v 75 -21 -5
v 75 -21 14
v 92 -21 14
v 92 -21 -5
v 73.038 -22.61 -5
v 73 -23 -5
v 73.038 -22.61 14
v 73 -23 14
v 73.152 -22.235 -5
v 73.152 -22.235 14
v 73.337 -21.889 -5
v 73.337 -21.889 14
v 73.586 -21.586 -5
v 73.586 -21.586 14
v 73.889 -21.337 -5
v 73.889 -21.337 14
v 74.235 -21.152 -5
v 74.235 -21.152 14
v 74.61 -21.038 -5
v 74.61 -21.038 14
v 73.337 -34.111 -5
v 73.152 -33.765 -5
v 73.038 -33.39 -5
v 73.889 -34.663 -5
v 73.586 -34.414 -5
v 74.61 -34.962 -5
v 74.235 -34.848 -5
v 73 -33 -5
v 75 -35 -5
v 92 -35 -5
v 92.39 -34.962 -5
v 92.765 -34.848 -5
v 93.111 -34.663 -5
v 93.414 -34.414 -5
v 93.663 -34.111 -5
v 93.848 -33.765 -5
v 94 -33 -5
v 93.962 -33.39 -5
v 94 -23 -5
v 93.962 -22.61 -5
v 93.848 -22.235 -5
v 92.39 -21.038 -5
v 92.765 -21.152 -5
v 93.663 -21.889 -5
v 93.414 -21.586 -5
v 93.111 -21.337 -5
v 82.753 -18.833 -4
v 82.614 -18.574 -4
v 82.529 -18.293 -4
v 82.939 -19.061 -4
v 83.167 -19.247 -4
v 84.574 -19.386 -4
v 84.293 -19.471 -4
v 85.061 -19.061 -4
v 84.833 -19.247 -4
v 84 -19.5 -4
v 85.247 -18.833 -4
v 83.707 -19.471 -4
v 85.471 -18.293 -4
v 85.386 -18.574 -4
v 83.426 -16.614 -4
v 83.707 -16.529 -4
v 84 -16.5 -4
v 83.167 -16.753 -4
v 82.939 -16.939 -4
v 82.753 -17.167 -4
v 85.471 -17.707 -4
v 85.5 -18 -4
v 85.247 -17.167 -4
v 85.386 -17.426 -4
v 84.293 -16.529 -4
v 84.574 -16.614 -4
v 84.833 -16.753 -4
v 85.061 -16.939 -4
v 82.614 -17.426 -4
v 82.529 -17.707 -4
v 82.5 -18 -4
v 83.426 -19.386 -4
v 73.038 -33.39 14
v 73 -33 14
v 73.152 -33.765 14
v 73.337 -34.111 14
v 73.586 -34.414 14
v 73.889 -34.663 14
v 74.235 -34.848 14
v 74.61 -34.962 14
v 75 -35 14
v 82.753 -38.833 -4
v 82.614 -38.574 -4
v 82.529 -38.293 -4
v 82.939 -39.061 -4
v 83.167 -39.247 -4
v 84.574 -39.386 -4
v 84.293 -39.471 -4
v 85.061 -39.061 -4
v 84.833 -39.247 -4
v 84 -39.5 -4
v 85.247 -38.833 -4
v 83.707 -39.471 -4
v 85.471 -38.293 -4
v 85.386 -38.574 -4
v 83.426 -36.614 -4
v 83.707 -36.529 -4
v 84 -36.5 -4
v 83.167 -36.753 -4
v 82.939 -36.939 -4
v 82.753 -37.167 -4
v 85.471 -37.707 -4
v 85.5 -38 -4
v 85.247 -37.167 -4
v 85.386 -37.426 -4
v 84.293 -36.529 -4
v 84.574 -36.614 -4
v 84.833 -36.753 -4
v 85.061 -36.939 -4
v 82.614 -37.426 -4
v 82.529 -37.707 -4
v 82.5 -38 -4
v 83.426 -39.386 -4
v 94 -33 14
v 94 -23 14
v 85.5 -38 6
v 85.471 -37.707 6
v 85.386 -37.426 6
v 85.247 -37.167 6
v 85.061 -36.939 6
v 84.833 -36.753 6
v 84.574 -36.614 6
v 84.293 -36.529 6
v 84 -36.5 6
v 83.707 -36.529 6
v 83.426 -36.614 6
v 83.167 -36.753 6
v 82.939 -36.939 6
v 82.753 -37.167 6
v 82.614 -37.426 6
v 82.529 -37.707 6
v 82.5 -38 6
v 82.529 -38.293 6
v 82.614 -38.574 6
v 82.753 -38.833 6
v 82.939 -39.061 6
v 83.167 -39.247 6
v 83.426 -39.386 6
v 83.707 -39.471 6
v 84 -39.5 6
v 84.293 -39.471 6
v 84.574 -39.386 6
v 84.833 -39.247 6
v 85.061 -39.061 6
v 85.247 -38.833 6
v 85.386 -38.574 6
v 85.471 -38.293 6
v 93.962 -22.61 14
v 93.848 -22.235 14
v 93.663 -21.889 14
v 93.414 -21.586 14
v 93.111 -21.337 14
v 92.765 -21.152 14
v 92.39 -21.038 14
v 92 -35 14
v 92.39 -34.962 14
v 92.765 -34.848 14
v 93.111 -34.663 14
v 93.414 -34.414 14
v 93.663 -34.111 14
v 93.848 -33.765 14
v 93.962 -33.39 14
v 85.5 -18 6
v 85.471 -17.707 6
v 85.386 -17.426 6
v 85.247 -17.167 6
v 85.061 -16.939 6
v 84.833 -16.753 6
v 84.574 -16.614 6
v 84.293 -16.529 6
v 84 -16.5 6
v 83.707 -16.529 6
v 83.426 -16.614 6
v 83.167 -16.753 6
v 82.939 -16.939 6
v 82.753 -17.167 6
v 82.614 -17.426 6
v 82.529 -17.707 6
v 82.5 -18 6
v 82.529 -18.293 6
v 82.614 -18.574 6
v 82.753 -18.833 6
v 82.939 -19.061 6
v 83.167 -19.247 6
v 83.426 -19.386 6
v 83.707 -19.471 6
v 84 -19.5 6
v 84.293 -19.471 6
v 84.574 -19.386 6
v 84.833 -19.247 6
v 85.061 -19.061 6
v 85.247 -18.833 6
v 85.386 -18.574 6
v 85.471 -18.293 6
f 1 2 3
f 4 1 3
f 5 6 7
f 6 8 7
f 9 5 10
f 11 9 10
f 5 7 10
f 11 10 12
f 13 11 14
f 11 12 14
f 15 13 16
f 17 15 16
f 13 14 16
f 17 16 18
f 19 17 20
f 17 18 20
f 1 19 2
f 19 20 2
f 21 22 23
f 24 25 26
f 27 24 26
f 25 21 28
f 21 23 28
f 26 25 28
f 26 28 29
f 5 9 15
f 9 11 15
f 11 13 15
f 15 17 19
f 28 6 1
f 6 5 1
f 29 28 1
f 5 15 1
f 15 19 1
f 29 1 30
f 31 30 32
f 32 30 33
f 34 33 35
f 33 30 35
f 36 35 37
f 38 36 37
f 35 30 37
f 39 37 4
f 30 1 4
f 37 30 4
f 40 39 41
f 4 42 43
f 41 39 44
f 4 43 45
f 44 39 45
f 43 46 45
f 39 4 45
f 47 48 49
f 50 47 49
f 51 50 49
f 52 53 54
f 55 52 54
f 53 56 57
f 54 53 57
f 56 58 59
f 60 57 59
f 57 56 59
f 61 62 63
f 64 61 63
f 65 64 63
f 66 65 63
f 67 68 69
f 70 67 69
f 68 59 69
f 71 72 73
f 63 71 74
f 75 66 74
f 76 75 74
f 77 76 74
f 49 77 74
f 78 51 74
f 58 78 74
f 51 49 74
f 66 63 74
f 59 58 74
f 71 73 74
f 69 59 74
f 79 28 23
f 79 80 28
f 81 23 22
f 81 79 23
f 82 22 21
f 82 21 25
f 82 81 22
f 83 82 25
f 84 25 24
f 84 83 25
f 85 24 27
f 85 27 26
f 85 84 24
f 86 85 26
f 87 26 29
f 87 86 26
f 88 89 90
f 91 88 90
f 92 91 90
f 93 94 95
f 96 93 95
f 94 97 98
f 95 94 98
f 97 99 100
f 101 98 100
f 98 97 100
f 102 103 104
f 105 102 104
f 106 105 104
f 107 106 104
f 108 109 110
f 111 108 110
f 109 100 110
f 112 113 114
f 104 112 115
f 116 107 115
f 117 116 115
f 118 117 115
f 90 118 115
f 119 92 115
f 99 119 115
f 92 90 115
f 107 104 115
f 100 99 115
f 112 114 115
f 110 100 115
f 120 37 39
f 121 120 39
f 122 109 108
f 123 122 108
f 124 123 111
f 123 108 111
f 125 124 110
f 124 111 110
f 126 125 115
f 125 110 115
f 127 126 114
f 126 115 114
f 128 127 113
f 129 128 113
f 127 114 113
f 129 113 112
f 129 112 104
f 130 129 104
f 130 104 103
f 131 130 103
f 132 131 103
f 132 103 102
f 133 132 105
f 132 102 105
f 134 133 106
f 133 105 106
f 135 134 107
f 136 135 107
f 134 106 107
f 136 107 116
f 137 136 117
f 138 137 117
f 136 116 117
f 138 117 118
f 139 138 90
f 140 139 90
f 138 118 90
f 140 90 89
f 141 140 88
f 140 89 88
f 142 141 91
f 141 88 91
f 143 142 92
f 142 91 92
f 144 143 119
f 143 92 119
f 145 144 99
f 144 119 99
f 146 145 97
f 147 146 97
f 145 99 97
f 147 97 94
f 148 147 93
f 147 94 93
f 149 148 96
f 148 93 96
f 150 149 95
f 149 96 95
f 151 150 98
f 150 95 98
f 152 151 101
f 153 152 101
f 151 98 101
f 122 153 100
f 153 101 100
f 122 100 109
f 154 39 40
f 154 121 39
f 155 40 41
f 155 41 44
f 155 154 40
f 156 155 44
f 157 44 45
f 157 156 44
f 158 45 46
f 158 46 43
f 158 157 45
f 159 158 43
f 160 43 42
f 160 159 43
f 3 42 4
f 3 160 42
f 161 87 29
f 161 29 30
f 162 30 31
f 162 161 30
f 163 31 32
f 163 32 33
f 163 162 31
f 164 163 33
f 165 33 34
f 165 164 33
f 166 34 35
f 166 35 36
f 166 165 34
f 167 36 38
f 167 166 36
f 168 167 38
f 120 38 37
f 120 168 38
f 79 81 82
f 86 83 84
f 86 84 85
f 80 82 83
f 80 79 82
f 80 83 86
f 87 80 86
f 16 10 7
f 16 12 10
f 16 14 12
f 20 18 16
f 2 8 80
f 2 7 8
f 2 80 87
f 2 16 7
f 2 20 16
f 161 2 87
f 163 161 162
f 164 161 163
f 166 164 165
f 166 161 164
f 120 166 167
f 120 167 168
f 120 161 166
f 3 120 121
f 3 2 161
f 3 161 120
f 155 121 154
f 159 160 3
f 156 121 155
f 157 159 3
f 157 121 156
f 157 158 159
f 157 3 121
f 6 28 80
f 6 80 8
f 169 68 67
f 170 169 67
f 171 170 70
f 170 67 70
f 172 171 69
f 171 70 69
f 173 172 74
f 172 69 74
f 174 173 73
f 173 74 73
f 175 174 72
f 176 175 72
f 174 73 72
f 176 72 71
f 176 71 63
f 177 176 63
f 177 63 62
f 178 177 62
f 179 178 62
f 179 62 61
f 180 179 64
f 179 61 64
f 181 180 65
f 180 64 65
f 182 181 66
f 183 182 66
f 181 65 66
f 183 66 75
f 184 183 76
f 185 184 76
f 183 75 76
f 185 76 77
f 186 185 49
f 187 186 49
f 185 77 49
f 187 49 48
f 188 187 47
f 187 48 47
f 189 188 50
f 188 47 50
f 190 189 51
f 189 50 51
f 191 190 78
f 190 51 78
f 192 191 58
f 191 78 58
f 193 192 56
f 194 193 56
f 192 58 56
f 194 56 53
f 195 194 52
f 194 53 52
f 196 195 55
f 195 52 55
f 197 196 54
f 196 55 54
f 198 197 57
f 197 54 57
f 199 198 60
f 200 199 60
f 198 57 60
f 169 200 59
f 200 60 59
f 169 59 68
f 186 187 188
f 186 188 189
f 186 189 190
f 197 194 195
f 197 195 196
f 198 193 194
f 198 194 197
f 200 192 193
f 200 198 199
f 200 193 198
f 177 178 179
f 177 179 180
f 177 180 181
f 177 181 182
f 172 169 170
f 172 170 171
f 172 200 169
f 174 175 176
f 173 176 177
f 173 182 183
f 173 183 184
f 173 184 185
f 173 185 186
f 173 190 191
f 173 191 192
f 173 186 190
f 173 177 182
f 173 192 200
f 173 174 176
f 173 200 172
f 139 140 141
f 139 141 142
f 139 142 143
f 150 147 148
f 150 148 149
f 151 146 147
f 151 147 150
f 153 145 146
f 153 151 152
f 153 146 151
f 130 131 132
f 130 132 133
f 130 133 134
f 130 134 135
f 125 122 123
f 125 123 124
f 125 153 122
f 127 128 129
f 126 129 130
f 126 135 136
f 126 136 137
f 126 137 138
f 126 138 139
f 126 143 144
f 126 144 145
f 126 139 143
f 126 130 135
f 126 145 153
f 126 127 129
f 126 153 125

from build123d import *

# Parameters (mm, degrees)
CYLINDER040_R     = 1.5
CYLINDER040_DEPTH = 10
CYLINDER039_R     = 1.5
CYLINDER039_DEPTH = 10
BOX043_W          = 21
BOX043_H          = 14
BOX043_DEPTH      = 19
FILLET001_R       = 2


with BuildPart() as cilindro003:
    # Cylinder040 → Cylinder040 (new body)
    with BuildSketch(Plane(origin=(84, -18, -4), x_dir=(1, 0, 0), z_dir=(0, 0, 1))):
        Circle(CYLINDER040_R)
    extrude(amount=CYLINDER040_DEPTH)


with BuildPart() as cilindro002:
    # Cylinder039 → Cylinder039 (new body)
    with BuildSketch(Plane(origin=(84, -38, -4), x_dir=(1, 0, 0), z_dir=(0, 0, 1))):
        Circle(CYLINDER039_R)
    extrude(amount=CYLINDER039_DEPTH)


with BuildPart() as plantillahuecosensor:
    # Box043 → Box043 (new body)
    with BuildSketch(Plane(origin=(73, -35, -5), x_dir=(1, 0, 0), z_dir=(0, 0, 1))):
        with Locations((10.5, 7)):
            Rectangle(BOX043_W, BOX043_H)
    extrude(amount=BOX043_DEPTH)

    # Fusion039: union Cilindro003, Cilindro002
    add(cilindro003.part)
    add(cilindro002.part)

    # Fillet001
    fillet001_edges = [plantillahuecosensor.edges().sort_by_distance(p)[0] for p in [
        (73, -35, 4.5),
        (73, -21, 4.5),
        (94, -35, 4.5),
        (94, -21, 4.5),
    ]]
    fillet(fillet001_edges, radius=FILLET001_R)


solid = plantillahuecosensor.part
